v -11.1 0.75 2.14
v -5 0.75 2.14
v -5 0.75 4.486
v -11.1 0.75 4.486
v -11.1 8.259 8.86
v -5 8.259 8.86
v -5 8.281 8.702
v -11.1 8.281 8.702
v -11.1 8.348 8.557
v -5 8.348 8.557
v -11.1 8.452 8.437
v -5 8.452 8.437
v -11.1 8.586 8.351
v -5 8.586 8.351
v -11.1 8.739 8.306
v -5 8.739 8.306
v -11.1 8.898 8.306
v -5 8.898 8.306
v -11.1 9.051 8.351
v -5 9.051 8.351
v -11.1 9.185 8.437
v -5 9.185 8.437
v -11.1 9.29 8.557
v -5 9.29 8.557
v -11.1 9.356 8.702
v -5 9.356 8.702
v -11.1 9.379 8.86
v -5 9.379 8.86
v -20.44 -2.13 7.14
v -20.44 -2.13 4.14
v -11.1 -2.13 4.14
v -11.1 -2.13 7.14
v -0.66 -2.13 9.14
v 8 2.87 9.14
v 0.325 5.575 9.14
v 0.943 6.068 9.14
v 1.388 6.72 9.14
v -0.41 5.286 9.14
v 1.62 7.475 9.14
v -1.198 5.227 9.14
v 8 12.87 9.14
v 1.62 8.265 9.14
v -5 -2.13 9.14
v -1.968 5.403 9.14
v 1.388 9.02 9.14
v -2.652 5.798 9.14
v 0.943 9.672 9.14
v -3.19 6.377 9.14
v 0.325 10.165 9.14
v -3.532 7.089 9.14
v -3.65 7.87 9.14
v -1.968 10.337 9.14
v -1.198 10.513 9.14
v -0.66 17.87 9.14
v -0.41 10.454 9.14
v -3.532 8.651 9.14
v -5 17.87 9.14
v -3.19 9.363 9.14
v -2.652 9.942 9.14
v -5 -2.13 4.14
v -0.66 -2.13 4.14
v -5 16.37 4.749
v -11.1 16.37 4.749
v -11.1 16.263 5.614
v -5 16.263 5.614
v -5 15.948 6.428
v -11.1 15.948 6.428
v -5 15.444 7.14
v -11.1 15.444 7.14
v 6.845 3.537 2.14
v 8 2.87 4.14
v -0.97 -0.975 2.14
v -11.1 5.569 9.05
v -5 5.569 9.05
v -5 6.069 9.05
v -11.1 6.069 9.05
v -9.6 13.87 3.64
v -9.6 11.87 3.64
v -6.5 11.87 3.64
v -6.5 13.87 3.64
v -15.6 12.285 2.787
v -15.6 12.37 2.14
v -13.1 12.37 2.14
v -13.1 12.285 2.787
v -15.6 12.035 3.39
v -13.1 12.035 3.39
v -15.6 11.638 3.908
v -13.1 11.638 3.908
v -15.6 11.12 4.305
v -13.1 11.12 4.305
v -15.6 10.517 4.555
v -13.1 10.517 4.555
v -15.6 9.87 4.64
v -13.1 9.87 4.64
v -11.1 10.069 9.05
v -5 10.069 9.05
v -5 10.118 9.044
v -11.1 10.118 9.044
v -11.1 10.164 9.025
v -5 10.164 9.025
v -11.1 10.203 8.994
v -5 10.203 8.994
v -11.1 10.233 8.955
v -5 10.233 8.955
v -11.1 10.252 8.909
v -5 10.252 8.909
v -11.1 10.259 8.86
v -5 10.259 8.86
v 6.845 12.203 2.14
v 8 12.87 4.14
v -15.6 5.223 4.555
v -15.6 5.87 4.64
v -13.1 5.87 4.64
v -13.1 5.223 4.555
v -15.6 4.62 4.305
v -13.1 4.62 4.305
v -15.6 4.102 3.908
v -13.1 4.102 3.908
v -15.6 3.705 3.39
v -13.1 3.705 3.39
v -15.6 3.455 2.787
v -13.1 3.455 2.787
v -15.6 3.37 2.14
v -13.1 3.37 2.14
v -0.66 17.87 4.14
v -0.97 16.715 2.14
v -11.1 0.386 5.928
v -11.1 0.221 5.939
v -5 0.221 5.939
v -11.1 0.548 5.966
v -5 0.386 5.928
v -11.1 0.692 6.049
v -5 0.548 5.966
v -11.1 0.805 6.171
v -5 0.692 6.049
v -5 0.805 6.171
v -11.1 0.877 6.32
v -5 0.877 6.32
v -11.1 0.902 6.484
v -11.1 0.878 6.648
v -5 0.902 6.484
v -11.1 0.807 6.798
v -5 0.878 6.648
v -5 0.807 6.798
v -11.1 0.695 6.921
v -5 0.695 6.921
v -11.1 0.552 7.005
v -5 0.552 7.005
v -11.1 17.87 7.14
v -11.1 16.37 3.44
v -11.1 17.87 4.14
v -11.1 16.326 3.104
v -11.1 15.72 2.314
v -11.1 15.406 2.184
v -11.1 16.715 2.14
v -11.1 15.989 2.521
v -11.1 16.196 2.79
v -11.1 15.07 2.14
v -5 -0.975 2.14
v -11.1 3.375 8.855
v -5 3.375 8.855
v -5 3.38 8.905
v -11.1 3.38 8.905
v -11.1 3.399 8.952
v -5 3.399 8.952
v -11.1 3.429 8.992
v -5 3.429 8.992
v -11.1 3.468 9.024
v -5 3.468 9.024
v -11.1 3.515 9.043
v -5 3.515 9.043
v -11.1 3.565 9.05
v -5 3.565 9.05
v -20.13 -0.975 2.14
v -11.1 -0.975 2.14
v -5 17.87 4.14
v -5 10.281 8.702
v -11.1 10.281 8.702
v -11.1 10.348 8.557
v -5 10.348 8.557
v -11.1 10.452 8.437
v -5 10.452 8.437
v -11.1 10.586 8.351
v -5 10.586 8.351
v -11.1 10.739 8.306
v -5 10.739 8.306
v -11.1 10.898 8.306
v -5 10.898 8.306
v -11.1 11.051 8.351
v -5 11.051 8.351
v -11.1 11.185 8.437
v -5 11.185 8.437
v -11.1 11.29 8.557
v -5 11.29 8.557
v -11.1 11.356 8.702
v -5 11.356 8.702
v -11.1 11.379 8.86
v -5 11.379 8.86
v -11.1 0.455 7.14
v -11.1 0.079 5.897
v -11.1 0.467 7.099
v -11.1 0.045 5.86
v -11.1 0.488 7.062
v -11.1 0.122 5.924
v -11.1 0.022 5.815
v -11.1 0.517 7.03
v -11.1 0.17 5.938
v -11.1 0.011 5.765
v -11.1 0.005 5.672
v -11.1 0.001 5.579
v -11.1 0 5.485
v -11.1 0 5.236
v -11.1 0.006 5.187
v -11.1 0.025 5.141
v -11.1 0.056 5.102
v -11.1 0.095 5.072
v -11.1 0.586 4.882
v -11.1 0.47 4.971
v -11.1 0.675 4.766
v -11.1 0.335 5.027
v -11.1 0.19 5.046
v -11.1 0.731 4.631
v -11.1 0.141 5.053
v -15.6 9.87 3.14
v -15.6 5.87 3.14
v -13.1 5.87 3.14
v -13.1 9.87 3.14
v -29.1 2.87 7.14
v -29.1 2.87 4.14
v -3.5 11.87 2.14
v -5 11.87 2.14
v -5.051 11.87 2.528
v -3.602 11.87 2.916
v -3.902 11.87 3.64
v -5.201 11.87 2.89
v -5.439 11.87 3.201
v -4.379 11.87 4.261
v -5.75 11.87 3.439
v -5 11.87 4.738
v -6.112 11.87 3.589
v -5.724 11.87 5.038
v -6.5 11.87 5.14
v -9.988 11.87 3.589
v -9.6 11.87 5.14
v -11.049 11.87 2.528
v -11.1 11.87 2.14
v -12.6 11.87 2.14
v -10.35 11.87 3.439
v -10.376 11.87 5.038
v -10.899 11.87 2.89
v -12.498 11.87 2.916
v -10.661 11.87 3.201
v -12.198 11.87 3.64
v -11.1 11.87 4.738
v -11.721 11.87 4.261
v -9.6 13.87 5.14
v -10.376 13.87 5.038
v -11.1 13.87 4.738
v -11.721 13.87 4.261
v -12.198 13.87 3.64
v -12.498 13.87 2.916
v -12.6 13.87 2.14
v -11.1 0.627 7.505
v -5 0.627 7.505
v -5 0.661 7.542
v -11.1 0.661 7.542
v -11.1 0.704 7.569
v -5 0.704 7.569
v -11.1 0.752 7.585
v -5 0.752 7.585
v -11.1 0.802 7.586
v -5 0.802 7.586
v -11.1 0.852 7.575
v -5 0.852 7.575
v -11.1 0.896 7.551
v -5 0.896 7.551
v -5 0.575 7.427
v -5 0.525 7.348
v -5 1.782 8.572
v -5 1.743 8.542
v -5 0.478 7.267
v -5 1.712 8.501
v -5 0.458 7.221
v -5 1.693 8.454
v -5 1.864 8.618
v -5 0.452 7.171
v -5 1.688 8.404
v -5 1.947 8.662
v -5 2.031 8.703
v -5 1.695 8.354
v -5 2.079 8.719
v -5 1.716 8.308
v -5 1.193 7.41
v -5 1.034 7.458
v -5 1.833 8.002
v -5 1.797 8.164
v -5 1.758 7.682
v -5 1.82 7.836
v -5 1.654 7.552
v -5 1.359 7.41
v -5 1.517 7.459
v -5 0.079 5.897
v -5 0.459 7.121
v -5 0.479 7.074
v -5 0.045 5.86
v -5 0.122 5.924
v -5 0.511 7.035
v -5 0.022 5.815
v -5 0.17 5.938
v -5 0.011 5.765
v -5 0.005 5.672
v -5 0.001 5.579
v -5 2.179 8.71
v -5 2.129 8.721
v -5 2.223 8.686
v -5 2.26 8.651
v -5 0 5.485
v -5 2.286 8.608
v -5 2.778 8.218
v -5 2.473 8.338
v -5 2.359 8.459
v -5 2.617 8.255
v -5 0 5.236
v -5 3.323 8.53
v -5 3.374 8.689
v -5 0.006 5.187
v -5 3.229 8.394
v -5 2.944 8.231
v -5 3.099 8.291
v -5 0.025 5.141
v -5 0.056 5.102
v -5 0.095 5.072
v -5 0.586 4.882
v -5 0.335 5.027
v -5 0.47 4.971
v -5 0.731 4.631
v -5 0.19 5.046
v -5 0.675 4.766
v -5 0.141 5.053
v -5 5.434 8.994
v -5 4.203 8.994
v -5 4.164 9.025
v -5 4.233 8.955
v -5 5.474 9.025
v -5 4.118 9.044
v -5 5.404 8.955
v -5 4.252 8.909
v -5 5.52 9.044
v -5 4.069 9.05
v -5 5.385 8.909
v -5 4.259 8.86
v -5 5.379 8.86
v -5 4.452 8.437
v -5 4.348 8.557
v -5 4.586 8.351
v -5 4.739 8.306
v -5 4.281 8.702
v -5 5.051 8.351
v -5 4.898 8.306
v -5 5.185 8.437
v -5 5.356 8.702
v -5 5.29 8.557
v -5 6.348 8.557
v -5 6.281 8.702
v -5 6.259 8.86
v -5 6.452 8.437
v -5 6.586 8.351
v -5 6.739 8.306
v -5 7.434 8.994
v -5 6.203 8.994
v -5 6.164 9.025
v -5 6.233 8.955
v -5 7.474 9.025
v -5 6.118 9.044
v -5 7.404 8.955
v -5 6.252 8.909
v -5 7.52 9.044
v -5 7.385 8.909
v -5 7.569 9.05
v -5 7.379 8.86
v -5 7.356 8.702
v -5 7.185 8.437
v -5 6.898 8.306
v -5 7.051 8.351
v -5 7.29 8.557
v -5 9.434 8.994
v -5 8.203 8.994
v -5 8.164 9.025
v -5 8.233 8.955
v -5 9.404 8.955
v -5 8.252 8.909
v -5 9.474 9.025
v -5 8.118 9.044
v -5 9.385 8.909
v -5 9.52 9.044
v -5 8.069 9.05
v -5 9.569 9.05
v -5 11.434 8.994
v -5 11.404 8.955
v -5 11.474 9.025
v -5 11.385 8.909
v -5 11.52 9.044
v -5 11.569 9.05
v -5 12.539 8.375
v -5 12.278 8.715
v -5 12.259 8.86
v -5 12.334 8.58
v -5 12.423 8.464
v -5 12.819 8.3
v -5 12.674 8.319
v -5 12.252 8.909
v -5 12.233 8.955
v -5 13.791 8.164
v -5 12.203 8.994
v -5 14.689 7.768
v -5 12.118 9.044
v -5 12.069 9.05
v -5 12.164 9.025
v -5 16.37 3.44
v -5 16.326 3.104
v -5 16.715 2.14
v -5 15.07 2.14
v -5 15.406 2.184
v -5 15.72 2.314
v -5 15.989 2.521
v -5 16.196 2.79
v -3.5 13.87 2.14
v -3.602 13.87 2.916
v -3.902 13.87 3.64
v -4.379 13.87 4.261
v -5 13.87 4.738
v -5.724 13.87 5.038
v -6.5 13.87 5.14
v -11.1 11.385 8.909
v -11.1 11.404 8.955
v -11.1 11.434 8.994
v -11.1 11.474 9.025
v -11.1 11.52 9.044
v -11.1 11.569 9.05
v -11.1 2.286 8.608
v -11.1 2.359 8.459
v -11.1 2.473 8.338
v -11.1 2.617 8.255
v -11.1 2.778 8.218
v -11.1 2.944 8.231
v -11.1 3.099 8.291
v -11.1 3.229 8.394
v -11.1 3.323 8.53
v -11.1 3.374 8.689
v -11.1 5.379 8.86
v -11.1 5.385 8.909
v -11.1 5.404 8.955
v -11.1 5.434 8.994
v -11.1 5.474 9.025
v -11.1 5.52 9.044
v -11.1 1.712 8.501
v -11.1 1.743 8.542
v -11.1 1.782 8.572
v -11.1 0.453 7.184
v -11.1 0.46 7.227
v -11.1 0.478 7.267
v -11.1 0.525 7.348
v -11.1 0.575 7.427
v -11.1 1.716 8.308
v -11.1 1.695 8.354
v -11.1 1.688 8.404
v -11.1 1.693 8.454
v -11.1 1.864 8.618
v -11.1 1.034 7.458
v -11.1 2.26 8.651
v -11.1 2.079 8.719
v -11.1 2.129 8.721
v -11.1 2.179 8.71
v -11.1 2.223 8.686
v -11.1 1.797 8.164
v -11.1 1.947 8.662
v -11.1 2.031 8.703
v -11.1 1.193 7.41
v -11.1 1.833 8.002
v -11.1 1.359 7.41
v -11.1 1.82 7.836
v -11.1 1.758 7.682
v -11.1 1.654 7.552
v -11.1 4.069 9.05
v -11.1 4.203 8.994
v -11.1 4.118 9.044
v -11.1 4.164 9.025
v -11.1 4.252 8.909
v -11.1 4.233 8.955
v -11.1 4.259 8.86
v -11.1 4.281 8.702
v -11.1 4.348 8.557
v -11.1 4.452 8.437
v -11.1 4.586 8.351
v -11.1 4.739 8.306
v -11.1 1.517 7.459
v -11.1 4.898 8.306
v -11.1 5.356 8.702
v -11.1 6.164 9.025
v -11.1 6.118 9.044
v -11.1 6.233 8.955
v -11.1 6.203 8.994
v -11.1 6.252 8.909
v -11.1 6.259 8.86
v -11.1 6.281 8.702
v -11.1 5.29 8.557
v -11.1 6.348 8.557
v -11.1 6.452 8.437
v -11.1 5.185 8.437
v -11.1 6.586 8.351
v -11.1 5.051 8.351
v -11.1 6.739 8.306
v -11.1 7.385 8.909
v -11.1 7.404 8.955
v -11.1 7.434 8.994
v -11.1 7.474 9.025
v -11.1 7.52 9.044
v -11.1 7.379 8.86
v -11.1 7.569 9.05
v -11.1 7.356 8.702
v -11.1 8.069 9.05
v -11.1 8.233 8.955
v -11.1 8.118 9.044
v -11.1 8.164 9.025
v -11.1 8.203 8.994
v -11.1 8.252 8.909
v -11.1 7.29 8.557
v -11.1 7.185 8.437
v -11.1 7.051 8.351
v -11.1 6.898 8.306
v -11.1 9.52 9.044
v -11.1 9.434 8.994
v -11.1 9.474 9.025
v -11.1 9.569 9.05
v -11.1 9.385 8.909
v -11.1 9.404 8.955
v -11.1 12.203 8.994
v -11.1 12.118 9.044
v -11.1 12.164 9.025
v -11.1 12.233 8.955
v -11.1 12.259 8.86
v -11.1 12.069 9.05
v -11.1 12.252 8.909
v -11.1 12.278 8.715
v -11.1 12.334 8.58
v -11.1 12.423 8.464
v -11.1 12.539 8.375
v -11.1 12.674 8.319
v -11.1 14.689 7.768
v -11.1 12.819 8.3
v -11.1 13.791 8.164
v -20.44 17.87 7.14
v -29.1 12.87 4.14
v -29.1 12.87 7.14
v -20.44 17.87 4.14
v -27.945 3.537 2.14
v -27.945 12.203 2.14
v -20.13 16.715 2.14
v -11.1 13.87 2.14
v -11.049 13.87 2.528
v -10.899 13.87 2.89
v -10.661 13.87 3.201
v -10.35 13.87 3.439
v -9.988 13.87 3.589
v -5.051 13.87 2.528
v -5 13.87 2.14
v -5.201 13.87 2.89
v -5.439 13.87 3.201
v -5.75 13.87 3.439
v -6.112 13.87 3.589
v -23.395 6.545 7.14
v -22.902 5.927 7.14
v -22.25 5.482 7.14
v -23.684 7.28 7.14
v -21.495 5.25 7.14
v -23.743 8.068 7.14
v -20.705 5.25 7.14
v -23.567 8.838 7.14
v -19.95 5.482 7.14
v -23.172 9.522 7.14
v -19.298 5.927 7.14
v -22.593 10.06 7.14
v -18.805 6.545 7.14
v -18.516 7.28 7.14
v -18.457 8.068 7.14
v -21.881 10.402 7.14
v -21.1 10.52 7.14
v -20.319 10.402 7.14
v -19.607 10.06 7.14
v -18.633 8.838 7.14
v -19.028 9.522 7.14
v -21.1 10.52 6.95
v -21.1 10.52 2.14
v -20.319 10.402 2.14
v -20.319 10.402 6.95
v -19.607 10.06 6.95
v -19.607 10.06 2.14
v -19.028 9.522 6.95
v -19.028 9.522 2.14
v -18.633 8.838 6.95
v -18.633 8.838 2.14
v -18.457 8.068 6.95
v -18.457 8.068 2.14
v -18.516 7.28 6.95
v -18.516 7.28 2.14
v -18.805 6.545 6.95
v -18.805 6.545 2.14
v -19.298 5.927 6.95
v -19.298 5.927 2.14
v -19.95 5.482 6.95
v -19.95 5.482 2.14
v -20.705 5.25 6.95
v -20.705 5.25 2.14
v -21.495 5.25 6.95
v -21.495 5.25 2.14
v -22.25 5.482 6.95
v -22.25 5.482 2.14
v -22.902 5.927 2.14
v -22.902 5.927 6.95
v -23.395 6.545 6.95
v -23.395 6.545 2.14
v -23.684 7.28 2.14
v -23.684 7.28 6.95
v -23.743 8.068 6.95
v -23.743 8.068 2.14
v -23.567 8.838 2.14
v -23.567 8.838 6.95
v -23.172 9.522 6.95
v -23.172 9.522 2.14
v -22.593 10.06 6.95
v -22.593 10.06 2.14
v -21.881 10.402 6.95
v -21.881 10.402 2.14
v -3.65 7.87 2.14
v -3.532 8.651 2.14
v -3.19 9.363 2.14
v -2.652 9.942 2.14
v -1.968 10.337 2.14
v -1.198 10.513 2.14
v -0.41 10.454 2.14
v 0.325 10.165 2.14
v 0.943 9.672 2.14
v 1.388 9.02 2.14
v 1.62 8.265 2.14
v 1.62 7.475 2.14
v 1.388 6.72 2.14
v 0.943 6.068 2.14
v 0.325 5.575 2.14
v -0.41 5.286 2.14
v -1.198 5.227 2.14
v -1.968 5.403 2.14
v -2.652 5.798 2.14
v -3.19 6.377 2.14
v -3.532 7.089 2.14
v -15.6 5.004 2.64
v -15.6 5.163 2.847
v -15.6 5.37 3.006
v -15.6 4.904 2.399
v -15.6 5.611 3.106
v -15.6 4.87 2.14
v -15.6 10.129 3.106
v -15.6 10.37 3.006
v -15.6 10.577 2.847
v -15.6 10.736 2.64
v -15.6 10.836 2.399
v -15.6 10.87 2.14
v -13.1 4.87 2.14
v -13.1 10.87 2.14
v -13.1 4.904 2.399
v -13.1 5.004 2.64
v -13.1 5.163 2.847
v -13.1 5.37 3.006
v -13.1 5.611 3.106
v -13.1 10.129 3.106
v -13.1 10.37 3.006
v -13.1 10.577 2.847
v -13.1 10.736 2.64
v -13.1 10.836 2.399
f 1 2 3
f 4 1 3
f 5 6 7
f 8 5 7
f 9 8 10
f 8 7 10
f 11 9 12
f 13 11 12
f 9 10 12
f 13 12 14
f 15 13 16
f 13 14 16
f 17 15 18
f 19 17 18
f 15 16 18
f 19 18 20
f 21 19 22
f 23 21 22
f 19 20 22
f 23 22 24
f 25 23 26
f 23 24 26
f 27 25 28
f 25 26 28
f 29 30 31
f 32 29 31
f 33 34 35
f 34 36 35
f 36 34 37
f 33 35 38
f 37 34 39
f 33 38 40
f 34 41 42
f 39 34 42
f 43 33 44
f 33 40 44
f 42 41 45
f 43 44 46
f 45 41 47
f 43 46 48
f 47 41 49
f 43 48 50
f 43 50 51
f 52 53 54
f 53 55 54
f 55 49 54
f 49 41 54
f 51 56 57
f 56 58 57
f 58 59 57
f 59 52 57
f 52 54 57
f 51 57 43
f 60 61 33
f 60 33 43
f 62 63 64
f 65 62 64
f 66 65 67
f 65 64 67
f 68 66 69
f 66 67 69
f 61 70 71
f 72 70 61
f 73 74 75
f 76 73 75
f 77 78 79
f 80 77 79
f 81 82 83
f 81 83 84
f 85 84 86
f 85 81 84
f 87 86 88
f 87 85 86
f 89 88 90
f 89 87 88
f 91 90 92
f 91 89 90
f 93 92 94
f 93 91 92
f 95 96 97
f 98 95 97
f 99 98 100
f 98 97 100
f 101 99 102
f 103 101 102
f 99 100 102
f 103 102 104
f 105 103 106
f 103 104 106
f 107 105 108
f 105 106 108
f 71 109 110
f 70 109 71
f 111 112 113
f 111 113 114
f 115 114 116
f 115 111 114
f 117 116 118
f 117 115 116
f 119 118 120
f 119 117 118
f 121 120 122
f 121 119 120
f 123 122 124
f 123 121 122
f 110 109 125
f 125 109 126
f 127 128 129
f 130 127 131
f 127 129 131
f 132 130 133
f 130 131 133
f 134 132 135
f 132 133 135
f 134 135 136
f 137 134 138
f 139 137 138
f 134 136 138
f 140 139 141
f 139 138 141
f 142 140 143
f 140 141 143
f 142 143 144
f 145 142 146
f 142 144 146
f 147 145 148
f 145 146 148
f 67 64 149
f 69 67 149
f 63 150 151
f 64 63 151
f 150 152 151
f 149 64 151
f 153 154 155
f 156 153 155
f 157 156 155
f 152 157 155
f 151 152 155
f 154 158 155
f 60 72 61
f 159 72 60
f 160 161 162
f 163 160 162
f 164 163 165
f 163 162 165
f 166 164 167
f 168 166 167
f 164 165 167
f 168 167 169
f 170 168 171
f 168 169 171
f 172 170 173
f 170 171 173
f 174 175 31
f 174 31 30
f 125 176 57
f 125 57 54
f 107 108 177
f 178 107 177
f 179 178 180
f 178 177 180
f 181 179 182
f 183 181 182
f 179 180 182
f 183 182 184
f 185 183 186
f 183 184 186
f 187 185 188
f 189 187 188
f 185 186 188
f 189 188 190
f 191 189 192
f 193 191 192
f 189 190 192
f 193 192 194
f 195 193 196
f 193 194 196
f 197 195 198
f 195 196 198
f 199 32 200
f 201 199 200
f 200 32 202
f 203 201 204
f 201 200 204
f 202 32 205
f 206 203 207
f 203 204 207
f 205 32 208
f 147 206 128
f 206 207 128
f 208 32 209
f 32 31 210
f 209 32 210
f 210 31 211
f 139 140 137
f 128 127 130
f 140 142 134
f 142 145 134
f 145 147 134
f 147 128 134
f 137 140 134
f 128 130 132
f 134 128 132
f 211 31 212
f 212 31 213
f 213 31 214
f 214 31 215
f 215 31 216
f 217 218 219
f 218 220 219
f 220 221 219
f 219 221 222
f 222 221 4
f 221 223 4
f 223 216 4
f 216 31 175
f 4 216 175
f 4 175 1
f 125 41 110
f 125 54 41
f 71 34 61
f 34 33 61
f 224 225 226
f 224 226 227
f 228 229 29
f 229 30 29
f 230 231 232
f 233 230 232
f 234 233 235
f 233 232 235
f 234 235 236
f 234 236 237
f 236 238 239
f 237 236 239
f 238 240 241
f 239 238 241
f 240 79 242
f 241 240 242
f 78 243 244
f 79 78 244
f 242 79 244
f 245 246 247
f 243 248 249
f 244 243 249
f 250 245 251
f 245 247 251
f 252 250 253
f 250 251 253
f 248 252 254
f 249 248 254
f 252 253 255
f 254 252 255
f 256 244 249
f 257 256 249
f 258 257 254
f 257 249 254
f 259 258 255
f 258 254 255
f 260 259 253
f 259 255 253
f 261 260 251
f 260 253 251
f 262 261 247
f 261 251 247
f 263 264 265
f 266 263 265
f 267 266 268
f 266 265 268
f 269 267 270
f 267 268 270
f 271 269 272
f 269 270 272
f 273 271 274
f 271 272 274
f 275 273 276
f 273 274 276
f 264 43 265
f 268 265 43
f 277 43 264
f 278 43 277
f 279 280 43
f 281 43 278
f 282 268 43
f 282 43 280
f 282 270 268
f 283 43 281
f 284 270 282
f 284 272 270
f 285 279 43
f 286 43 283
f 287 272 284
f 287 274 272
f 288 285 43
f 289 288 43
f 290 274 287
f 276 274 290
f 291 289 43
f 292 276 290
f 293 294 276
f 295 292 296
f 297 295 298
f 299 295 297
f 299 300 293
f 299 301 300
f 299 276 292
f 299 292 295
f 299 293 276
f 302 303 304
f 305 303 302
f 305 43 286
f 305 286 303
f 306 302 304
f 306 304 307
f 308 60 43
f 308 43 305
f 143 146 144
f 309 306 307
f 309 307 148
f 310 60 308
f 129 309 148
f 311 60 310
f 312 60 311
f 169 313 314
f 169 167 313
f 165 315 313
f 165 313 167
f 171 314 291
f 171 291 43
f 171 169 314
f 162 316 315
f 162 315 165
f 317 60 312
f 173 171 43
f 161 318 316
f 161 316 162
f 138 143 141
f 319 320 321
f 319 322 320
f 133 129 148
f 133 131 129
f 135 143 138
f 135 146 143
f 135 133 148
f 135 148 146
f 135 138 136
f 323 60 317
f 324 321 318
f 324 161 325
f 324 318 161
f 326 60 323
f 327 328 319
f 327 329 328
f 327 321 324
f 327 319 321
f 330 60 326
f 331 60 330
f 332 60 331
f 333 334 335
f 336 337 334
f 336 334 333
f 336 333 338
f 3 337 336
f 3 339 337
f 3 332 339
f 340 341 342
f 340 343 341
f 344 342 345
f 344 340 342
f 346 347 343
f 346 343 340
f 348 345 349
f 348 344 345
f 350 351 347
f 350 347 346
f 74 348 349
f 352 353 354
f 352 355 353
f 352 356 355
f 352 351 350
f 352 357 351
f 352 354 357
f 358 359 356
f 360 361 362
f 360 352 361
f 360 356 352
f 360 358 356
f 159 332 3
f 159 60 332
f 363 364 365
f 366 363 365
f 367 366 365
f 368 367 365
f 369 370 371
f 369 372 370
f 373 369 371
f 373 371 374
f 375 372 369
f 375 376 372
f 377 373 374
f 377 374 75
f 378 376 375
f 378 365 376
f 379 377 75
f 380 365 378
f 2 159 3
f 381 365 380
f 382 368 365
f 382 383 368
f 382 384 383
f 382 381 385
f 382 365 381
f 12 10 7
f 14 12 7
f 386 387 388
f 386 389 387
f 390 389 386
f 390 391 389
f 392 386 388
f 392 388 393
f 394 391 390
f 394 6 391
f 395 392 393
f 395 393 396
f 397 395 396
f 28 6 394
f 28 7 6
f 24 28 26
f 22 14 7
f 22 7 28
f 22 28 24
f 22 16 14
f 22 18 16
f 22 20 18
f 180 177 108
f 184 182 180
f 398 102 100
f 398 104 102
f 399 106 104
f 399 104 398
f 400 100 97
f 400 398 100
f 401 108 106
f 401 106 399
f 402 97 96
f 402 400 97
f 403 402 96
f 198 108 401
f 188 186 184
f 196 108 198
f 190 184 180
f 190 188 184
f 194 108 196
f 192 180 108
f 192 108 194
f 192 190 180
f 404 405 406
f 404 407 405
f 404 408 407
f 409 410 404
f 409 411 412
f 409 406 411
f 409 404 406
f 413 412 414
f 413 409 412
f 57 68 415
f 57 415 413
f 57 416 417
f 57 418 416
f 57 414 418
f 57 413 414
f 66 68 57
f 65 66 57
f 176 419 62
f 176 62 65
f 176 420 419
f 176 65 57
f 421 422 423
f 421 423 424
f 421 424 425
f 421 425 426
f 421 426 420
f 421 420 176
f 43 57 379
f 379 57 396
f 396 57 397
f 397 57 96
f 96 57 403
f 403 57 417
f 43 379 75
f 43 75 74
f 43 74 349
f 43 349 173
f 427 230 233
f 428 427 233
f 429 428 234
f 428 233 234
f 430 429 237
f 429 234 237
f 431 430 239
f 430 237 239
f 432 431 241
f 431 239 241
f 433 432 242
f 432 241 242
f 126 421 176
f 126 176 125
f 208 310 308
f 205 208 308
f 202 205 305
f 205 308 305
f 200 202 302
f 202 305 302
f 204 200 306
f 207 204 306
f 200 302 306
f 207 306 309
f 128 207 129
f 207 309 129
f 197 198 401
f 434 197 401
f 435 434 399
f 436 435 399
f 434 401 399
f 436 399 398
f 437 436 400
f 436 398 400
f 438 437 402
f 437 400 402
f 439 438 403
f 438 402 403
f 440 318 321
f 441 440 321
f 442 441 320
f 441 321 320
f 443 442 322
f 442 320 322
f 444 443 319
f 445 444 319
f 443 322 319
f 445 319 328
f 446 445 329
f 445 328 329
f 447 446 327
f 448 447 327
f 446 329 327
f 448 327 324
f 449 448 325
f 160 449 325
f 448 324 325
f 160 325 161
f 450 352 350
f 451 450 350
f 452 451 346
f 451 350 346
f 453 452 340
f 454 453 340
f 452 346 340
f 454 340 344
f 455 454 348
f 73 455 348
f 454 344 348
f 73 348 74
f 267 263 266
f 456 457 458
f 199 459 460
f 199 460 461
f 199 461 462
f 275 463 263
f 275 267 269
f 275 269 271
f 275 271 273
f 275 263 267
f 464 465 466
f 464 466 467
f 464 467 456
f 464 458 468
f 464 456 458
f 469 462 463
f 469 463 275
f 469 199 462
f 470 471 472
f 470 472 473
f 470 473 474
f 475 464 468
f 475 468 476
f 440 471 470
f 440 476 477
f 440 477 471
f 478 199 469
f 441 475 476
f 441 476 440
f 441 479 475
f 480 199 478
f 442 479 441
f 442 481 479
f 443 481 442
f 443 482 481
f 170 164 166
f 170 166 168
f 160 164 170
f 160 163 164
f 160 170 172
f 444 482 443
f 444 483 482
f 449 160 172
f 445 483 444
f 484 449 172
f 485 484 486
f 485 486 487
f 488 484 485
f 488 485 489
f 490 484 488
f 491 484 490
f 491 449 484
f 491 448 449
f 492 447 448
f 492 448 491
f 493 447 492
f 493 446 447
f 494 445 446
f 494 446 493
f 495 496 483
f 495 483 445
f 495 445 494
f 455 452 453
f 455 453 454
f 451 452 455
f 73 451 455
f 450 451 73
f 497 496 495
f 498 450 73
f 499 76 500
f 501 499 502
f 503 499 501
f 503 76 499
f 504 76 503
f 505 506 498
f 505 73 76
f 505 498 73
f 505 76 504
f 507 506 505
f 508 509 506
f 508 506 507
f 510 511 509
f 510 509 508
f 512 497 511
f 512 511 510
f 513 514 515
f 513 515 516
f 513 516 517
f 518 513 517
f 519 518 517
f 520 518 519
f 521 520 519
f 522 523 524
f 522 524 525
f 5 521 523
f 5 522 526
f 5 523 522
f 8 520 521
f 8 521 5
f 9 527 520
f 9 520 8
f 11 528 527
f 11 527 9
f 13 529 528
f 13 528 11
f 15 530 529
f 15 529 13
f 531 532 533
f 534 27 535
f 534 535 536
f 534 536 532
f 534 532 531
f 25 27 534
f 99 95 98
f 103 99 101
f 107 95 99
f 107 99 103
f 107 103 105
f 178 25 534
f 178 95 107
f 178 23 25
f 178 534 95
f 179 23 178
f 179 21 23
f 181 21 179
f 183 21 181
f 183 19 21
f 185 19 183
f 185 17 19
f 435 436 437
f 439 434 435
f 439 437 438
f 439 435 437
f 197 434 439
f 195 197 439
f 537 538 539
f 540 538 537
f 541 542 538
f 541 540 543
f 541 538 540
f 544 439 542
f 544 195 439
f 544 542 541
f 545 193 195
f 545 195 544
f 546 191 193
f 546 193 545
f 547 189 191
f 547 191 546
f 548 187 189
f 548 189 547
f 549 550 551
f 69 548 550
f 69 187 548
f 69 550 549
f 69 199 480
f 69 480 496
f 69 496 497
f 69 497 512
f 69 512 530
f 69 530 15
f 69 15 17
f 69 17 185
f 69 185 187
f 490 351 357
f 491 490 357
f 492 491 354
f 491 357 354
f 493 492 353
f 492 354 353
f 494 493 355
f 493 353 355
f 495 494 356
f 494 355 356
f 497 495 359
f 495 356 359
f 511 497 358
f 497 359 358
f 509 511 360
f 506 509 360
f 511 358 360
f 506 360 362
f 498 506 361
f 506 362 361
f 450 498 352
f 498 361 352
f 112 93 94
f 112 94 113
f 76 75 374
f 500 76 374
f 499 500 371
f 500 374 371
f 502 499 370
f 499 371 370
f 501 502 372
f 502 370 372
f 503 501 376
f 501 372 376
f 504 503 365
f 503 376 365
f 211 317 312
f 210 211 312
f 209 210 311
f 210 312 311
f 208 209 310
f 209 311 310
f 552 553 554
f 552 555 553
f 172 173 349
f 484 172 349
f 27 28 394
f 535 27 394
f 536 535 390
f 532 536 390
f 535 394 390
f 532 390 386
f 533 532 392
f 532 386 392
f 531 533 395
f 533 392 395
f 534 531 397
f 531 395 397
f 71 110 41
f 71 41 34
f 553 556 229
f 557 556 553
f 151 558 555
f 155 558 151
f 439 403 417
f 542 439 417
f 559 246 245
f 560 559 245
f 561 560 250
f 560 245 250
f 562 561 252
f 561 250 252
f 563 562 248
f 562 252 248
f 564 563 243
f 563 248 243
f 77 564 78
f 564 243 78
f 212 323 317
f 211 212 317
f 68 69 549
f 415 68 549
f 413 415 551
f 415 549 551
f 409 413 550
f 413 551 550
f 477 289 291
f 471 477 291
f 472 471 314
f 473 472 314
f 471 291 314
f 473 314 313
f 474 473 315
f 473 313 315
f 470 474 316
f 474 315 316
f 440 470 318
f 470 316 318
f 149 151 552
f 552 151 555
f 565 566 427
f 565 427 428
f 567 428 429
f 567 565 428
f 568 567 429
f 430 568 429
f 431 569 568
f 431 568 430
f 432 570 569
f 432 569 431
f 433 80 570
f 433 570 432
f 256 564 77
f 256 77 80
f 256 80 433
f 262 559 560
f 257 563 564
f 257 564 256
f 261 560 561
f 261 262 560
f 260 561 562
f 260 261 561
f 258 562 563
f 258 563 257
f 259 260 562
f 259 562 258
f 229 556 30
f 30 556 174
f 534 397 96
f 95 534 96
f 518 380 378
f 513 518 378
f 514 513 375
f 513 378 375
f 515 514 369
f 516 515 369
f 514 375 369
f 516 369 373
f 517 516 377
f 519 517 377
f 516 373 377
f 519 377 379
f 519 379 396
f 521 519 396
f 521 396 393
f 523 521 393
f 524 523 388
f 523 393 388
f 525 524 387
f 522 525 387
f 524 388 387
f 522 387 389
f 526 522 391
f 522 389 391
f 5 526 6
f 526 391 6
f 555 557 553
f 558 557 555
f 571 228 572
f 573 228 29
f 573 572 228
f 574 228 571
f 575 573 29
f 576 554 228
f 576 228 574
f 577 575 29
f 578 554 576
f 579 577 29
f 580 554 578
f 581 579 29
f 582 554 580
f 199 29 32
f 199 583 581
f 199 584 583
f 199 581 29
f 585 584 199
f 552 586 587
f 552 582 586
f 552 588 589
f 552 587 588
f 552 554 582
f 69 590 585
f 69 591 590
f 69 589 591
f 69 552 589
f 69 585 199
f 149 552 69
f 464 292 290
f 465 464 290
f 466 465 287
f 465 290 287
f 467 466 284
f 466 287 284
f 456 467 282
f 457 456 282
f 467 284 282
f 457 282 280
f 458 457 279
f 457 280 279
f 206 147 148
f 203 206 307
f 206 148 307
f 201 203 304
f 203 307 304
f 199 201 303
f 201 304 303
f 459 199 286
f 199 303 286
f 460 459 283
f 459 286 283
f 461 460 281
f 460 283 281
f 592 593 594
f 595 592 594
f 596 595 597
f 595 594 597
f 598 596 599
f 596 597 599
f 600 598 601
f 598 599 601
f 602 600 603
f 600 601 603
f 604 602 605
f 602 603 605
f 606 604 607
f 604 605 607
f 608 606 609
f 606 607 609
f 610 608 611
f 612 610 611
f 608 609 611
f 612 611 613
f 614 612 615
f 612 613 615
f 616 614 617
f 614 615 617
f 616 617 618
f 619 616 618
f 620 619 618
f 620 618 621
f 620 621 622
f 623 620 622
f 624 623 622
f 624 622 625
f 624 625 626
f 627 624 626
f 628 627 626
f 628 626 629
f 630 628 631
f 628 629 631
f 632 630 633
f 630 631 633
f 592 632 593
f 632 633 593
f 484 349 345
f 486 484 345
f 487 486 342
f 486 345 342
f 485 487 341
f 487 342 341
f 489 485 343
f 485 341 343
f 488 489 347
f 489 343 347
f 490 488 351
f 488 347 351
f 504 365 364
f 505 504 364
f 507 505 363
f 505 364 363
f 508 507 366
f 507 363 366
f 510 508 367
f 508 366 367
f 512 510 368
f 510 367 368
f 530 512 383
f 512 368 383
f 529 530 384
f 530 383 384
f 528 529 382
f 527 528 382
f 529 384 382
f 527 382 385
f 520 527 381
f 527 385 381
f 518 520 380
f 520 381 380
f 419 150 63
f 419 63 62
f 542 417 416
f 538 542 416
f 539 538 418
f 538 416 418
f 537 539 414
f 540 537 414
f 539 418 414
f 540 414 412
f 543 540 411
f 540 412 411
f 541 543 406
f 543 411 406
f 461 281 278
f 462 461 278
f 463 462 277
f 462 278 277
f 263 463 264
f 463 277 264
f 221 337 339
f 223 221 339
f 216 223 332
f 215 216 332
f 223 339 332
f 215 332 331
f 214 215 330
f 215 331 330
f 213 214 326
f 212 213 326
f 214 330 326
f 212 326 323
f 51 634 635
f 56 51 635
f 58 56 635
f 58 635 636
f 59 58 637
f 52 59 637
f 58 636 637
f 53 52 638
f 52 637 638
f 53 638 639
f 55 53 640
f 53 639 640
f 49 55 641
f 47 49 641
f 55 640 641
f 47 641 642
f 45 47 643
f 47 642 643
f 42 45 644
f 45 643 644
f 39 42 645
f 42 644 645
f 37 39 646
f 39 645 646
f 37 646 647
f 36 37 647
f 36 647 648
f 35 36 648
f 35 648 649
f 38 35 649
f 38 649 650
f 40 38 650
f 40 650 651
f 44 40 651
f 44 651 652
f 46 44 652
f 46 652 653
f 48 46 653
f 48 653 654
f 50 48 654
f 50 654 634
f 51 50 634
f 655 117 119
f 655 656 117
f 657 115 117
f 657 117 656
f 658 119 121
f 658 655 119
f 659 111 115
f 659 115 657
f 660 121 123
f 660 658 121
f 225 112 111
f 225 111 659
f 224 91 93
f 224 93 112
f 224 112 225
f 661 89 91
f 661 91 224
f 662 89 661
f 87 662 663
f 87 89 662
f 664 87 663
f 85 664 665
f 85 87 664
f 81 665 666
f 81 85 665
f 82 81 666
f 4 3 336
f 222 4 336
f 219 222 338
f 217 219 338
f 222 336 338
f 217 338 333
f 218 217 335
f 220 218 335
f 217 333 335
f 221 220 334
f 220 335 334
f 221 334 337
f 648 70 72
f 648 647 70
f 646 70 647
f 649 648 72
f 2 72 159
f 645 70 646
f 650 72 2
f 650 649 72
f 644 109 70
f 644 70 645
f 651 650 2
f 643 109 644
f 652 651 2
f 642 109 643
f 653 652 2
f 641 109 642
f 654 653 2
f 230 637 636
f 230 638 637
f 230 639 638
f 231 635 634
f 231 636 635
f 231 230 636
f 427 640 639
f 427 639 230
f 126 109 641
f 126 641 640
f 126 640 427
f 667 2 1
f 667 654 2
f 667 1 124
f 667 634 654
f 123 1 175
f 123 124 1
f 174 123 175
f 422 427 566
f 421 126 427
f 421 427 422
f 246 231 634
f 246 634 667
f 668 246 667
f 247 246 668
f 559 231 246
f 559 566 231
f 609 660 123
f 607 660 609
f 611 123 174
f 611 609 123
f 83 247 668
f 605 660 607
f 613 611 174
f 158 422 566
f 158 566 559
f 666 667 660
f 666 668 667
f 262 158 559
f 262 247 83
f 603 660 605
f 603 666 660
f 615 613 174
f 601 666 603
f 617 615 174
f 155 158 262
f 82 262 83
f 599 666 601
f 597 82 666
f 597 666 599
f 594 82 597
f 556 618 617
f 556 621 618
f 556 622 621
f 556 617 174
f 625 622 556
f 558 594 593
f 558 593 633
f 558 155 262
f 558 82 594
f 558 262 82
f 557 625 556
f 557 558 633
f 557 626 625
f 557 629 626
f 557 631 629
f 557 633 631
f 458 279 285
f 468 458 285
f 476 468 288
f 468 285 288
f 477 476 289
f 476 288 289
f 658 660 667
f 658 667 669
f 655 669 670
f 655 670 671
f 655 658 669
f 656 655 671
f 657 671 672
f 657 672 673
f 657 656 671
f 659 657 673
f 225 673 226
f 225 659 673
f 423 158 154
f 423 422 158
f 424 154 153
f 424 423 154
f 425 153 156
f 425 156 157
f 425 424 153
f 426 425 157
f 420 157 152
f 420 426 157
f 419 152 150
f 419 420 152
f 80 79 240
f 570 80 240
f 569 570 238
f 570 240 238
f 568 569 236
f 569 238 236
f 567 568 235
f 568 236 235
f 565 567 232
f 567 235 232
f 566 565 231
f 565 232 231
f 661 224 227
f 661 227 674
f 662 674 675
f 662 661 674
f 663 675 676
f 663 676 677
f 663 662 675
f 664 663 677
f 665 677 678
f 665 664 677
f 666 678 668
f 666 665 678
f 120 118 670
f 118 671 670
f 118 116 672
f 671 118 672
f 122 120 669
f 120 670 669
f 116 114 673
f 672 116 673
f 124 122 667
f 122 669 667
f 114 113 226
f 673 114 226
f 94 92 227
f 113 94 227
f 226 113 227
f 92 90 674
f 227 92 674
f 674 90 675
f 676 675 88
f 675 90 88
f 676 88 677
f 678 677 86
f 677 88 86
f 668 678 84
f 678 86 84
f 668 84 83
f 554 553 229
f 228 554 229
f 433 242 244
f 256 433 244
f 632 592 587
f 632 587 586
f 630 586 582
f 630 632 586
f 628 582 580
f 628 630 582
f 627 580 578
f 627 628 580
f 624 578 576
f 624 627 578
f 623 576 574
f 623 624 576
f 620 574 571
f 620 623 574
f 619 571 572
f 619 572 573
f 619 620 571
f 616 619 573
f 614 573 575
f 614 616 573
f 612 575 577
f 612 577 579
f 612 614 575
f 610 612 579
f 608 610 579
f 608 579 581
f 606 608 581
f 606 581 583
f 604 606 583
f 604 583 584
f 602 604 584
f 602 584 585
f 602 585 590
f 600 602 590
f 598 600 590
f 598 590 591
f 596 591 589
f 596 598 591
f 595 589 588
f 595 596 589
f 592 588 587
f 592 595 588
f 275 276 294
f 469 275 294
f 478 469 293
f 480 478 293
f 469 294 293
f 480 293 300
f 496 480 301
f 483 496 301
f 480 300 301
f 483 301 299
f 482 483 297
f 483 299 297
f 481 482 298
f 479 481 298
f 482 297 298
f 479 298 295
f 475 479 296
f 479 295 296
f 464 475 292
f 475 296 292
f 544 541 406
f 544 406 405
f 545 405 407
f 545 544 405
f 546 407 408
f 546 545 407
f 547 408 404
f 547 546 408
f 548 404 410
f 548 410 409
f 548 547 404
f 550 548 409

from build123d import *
from OCP.BRepFilletAPI import BRepFilletAPI_MakeChamfer

# Parameters (mm, degrees)
AUFSATZ_LINEAR_AUSTRAGEN1_DEPTH    = 6.1
SKIZZE1_W                          = 6
SKIZZE1_H                          = 15
AUFSATZ_LINEAR_AUSTRAGEN1_2_DEPTH  = 6.1
SKIZZE2_W                          = 6
SKIZZE2_H                          = 15
SCHNITT_LINEAR_AUSTRAGEN1_DEPTH    = 6.1
SKIZZE3_R                          = 2.65
AUFSATZ_LINEAR_AUSTRAGEN2_DEPTH    = 2.19
SCHNITT_LINEAR_AUSTRAGEN7_DEPTH    = 6.1
AUFSATZ_LINEAR_START               = 4.81
SKIZZE4_R                          = 2.65
AUFSATZ_LINEAR_AUSTRAGEN3_DEPTH    = 4.81
SKIZZE5_R                          = 2.65
AUFSATZ_LINEAR_AUSTRAGEN4_DEPTH    = 0.19
FASE1_SIZE                         = 5
FASE1_SIZE2                        = 8.660254038
FASE2_SIZE                         = 2
FASE2_SIZE2                        = 1.154700538
SCHNITT_LINEAR_START               = -14
SCHNITT_LINEAR_AUSTRAGEN8_DEPTH    = 2
SCHNITT_LINEAR_START_2             = -13.5
SCHNITT_LINEAR_AUSTRAGEN5_DEPTH    = 2.5
VERRUNDUNG1_R                      = 1.3
SCHNITT_LINEAR_AUSTRAGEN9_DEPTH    = 6.1
K_RPER_VERSCHIEBEN_KOPIEREN1_ANGLE = 90


with BuildPart() as part:
    # Skizze1 → Aufsatz-Linear austragen1 (new body)
    with BuildSketch(Plane.XY):
        with BuildLine():
            Line((-7.050000002, 7.568775844), (-7.050000002, 8.068775844))
            ThreePointArc((-7.050000002, 8.068775844), (-7.105649713, 8.203126132), (-7.240000002, 8.258775844))
            ThreePointArc((-7.240000002, 8.258775844), (-7.800000002, 8.818775844), (-7.240000002, 9.378775844))
            ThreePointArc((-7.240000002, 9.378775844), (-7.105649713, 9.434425555), (-7.050000002, 9.568775844))
            Line((-7.050000002, 9.568775844), (-7.050000002, 10.068775844))
            ThreePointArc((-7.050000002, 10.068775844), (-7.105649713, 10.203126132), (-7.240000002, 10.258775844))
            ThreePointArc((-7.240000002, 10.258775844), (-7.800000002, 10.818775844), (-7.240000002, 11.378775844))
            ThreePointArc((-7.240000002, 11.378775844), (-7.105649713, 11.434425555), (-7.050000002, 11.568775844))
            Line((-7.050000002, 11.568775844), (-7.050000002, 12.068775844))
            ThreePointArc((-7.050000002, 12.068775844), (-7.105649713, 12.203126132), (-7.240000002, 12.258775843))
            Line((-7.240000002, 12.258775843), (-9.150000002, 12.258775843))
            Line((-9.150000002, 12.258775843), (-9.150000002, 4))
            Line((-9.150000002, 4), (-10.615000002, 4))
            Line((-10.615000002, 4), (-13.960000002, 4))
            Line((-13.960000002, 4), (-13.960000002, 0.75))
            Line((-13.960000002, 0.75), (-11.613821225, 0.75))
            ThreePointArc((-11.613821225, 0.75), (-11.217841428, 0.585979797), (-11.053821225, 0.19))
            ThreePointArc((-11.053821225, 0.19), (-10.998171513, 0.055649712), (-10.863821225, 0))
            Line((-10.863821225, 0), (-10.615000002, 0))
            ThreePointArc((-10.615000002, 0), (-10.474650873, 0.002763747), (-10.334519354, 0.011050703))
            ThreePointArc((-10.334519354, 0.011050703), (-10.203241743, 0.079144265), (-10.160552613, 0.22073587))
            ThreePointArc((-10.160552613, 0.22073587), (-9.779942741, 0.876709768), (-9.094653704, 0.551833537))
            ThreePointArc((-9.094653704, 0.551833537), (-8.979253962, 0.459348706), (-8.832500002, 0.477619436))
            ThreePointArc((-8.832500002, 0.477619436), (-8.712335964, 0.550187475), (-8.595121987, 0.627429949))
            ThreePointArc((-8.595121987, 0.627429949), (-8.515479022, 0.752039509), (-8.549304953, 0.896006001))
            ThreePointArc((-8.549304953, 0.896006001), (-8.547674084, 1.654400997), (-7.791758254, 1.715694446))
            ThreePointArc((-7.791758254, 1.715694446), (-7.64557673, 1.693300104), (-7.527619437, 1.7825))
            ThreePointArc((-7.527619437, 1.7825), (-7.459838348, 1.905427785), (-7.396949303, 2.030928718))
            ThreePointArc((-7.396949303, 2.030928718), (-7.390281252, 2.178665245), (-7.491558614, 2.286430919))
            ThreePointArc((-7.491558614, 2.286430919), (-7.869343738, 2.944035686), (-7.24534815, 3.375075285))
            ThreePointArc((-7.24534815, 3.375075285), (-7.107554066, 3.428771978), (-7.050000002, 3.565))
            Line((-7.050000002, 3.565), (-7.050000002, 4.068775844))
            ThreePointArc((-7.050000002, 4.068775844), (-7.105649713, 4.203126132), (-7.240000002, 4.258775844))
            ThreePointArc((-7.240000002, 4.258775844), (-7.800000002, 4.818775844), (-7.240000002, 5.378775844))
            ThreePointArc((-7.240000002, 5.378775844), (-7.105649713, 5.434425555), (-7.050000002, 5.568775844))
            Line((-7.050000002, 5.568775844), (-7.050000002, 6.068775844))
            ThreePointArc((-7.050000002, 6.068775844), (-7.105649713, 6.203126132), (-7.240000002, 6.258775844))
            ThreePointArc((-7.240000002, 6.258775844), (-7.800000002, 6.818775844), (-7.240000002, 7.378775844))
            ThreePointArc((-7.240000002, 7.378775844), (-7.105649713, 7.434425555), (-7.050000002, 7.568775844))
        make_face()
    extrude(amount=AUFSATZ_LINEAR_AUSTRAGEN1_DEPTH)

    # Skizze3 → Aufsatz-Linear austragen2 (add)
    with BuildSketch(Plane.ZY.offset(9.150000002)):
        Polygon((6.1, 12.258775843), (6.1, 16.37), (0, 16.37), (0, 17.87), (-13, 17.87), (-13, -2.13), (0, -2.13), (0, 12.258775843), align=None)
        with Locations((-4, 7.87)):
            Circle(SKIZZE3_R, mode=Mode.SUBTRACT)
    extrude(amount=-AUFSATZ_LINEAR_AUSTRAGEN2_DEPTH)

    # Skizze15 → Schnitt-Linear austragen7 (cut)
    with BuildSketch(Plane.XY.offset(6.1)):
        with BuildLine():
            Line((-7.800000002, 12.818775843), (-7.800000002, 15.07))
            ThreePointArc((-7.800000002, 15.07), (-8.180761186, 15.989238816), (-9.100000002, 16.37))
            Line((-9.100000002, 16.37), (-6.960000002, 16.37))
            Line((-6.960000002, 16.37), (-6.960000002, 12.258775843))
            Line((-6.960000002, 12.258775843), (-7.240000002, 12.258775843))
            ThreePointArc((-7.240000002, 12.258775843), (-7.635979799, 12.422796046), (-7.800000002, 12.818775843))
        make_face()
    extrude(amount=-SCHNITT_LINEAR_AUSTRAGEN7_DEPTH, mode=Mode.SUBTRACT)

    # Skizze4 → Aufsatz-Linear austragen3 (add)
    with BuildSketch(Plane.ZY.offset(9.150000002).offset(AUFSATZ_LINEAR_START)):
        Polygon((6.1, 17.87), (6.1, 16.37), (0, 16.37), (0, 17.87), (-13, 17.87), (-13, -2.13), (0, -2.13), (0, 4), (6.1, 4), (6.1, -2.13), (24.1, -2.13), (24.1, 17.87), align=None)
        with Locations(Location((16.1, 7.87, 0), (0, 0, 90))):
            Circle(SKIZZE4_R, mode=Mode.SUBTRACT)
        with Locations((-4, 7.87)):
            Circle(SKIZZE4_R, mode=Mode.SUBTRACT)
    extrude(amount=-AUFSATZ_LINEAR_AUSTRAGEN3_DEPTH)

    # Skizze5 → Aufsatz-Linear austragen4 (add)
    with BuildSketch(Plane(origin=(-9.150000002, 0, 0), x_dir=(0, 0, -1), z_dir=(1, 0, 0))):
        Polygon((-6.1, 17.87), (-24.1, 17.87), (-24.1, -2.13), (-6.1, -2.13), (-6.1, 0.655715781), (-6.1, 16.37), align=None)
        with Locations(Location((-16.1, 7.87, 0), (0, 0, 90))):
            Circle(SKIZZE5_R, mode=Mode.SUBTRACT)
    extrude(amount=AUFSATZ_LINEAR_AUSTRAGEN4_DEPTH)

    # Fase1: one chamfer whose edges measure the first distance from different faces: ONE call of the kernel's chamfer builder (chamfer() names one face for all edges)
    fase1_edges_1 = [part.edges().sort_by_distance(p)[0] for p in [
        (-10.460000002, -2.13, -13),
        (-10.460000002, 17.87, -13),
    ]]
    fase1_side_1 = [part.faces().sort_by_distance(p)[0] for p in [
        (-10.460000002, 7.87, -13),
    ]]
    fase1_edges_2 = [part.edges().sort_by_distance(p)[0] for p in [
        (-11.460000002, 17.87, 24.1),
        (-11.460000002, -2.13, 24.1),
    ]]
    fase1_side_2 = [part.faces().sort_by_distance(p)[0] for p in [
        (-11.460000002, 7.87, 24.1),
    ]]
    fase1 = BRepFilletAPI_MakeChamfer(part.part.solid().wrapped)
    for e in fase1_edges_1:
        fase1.Add(FASE1_SIZE, FASE1_SIZE2, e.wrapped, fase1_side_1[0].wrapped)  # the first distance lies on this face
    for e in fase1_edges_2:
        fase1.Add(FASE1_SIZE, FASE1_SIZE2, e.wrapped, fase1_side_2[0].wrapped)  # the first distance lies on this face
    add(Compound.cast(fase1.Shape()), mode=Mode.REPLACE)

    # Fase2: one chamfer whose edges measure the first distance from different faces: ONE call of the kernel's chamfer builder (chamfer() names one face for all edges)
    fase2_edges_1 = [part.edges().sort_by_distance(p)[0] for p in [
        (-13.960000002, 17.87, 10.769872981),
    ]]
    fase2_side_1 = [part.faces().sort_by_distance(p)[0] for p in [
        (-11.460000002, 17.87, 10.769872981),
    ]]
    fase2_edges_2 = [part.edges().sort_by_distance(p)[0] for p in [
        (-13.960000002, 17.87, -2.169872981),
    ]]
    fase2_side_2 = [part.faces().sort_by_distance(p)[0] for p in [
        (-10.460000002, 17.87, -2.169872981),
    ]]
    fase2_edges_3 = [part.edges().sort_by_distance(p)[0] for p in [
        (-13.960000002, -2.13, 10.769872981),
    ]]
    fase2_side_3 = [part.faces().sort_by_distance(p)[0] for p in [
        (-11.460000002, -2.13, 10.769872981),
    ]]
    fase2_edges_4 = [part.edges().sort_by_distance(p)[0] for p in [
        (-13.960000002, 7.87, 24.1),
    ]]
    fase2_side_4 = [part.faces().sort_by_distance(p)[0] for p in [
        (-11.460000002, 7.87, 24.1),
    ]]
    fase2_edges_5 = [part.edges().sort_by_distance(p)[0] for p in [
        (-13.960000002, 7.87, -13),
    ]]
    fase2_side_5 = [part.faces().sort_by_distance(p)[0] for p in [
        (-10.460000002, 7.87, -13),
    ]]
    fase2_edges_6 = [part.edges().sort_by_distance(p)[0] for p in [
        (-13.960000002, -2.13, -2.169872981),
    ]]
    fase2_side_6 = [part.faces().sort_by_distance(p)[0] for p in [
        (-10.460000002, -2.13, -2.169872981),
    ]]
    fase2_edges_7 = [part.edges().sort_by_distance(p)[0] for p in [
        (-13.960000002, 0.37, -8.669872981),
    ]]
    fase2_side_7 = [part.faces().sort_by_distance(p)[0] for p in [
        (-10.460000002, 0.37, -8.669872981),
    ]]
    fase2_edges_8 = [part.edges().sort_by_distance(p)[0] for p in [
        (-13.960000002, 0.37, 19.769872981),
    ]]
    fase2_side_8 = [part.faces().sort_by_distance(p)[0] for p in [
        (-11.460000002, 0.37, 19.769872981),
    ]]
    fase2_edges_9 = [part.edges().sort_by_distance(p)[0] for p in [
        (-13.960000002, 15.37, -8.669872981),
    ]]
    fase2_side_9 = [part.faces().sort_by_distance(p)[0] for p in [
        (-10.460000002, 15.37, -8.669872981),
    ]]
    fase2_edges_10 = [part.edges().sort_by_distance(p)[0] for p in [
        (-13.960000002, 15.37, 19.769872981),
    ]]
    fase2_side_10 = [part.faces().sort_by_distance(p)[0] for p in [
        (-11.460000002, 15.37, 19.769872981),
    ]]
    fase2 = BRepFilletAPI_MakeChamfer(part.part.solid().wrapped)
    for e in fase2_edges_1:
        fase2.Add(FASE2_SIZE, FASE2_SIZE2, e.wrapped, fase2_side_1[0].wrapped)  # the first distance lies on this face
    for e in fase2_edges_2:
        fase2.Add(FASE2_SIZE, FASE2_SIZE2, e.wrapped, fase2_side_2[0].wrapped)  # the first distance lies on this face
    for e in fase2_edges_3:
        fase2.Add(FASE2_SIZE, FASE2_SIZE2, e.wrapped, fase2_side_3[0].wrapped)  # the first distance lies on this face
    for e in fase2_edges_4:
        fase2.Add(FASE2_SIZE, FASE2_SIZE2, e.wrapped, fase2_side_4[0].wrapped)  # the first distance lies on this face
    for e in fase2_edges_5:
        fase2.Add(FASE2_SIZE, FASE2_SIZE2, e.wrapped, fase2_side_5[0].wrapped)  # the first distance lies on this face
    for e in fase2_edges_6:
        fase2.Add(FASE2_SIZE, FASE2_SIZE2, e.wrapped, fase2_side_6[0].wrapped)  # the first distance lies on this face
    for e in fase2_edges_7:
        fase2.Add(FASE2_SIZE, FASE2_SIZE2, e.wrapped, fase2_side_7[0].wrapped)  # the first distance lies on this face
    for e in fase2_edges_8:
        fase2.Add(FASE2_SIZE, FASE2_SIZE2, e.wrapped, fase2_side_8[0].wrapped)  # the first distance lies on this face
    for e in fase2_edges_9:
        fase2.Add(FASE2_SIZE, FASE2_SIZE2, e.wrapped, fase2_side_9[0].wrapped)  # the first distance lies on this face
    for e in fase2_edges_10:
        fase2.Add(FASE2_SIZE, FASE2_SIZE2, e.wrapped, fase2_side_10[0].wrapped)  # the first distance lies on this face
    add(Compound.cast(fase2.Shape()), mode=Mode.REPLACE)

    # Skizze11 → Schnitt-Linear austragen8 (cut)
    with BuildSketch(Plane.XZ.offset(2.13).offset(SCHNITT_LINEAR_START)):
        with BuildLine():
            Line((-13.960000002, 7.6), (-13.960000002, 6.1))
            ThreePointArc((-13.960000002, 6.1), (-12.89933983, 5.660660172), (-12.460000002, 4.6))
            Line((-12.460000002, 4.6), (-12.460000002, 1.5))
            ThreePointArc((-12.460000002, 1.5), (-12.89933983, 0.439339828), (-13.960000002, 0))
            Line((-13.960000002, 0), (-13.960000002, -1.5))
            ThreePointArc((-13.960000002, -1.5), (-11.838679658, -0.621320344), (-10.960000002, 1.5))
            Line((-10.960000002, 1.5), (-10.960000002, 4.6))
            ThreePointArc((-10.960000002, 4.6), (-11.838679658, 6.721320344), (-13.960000002, 7.6))
        make_face()
    extrude(amount=-SCHNITT_LINEAR_AUSTRAGEN8_DEPTH, mode=Mode.SUBTRACT)

    # Skizze13 → Schnitt-Linear austragen5 (cut)
    with BuildSketch(Plane.XY.offset(24.1).offset(SCHNITT_LINEAR_START_2)):
        with BuildLine():
            Line((-12.960000002, 5.87), (-12.960000002, 9.87))
            ThreePointArc((-12.960000002, 9.87), (-13.252893221, 10.577106781), (-13.960000002, 10.87))
            Line((-13.960000002, 10.87), (-13.960000002, 12.37))
            ThreePointArc((-13.960000002, 12.37), (-12.192233049, 11.637766953), (-11.460000002, 9.87))
            Line((-11.460000002, 9.87), (-11.460000002, 5.87))
            ThreePointArc((-11.460000002, 5.87), (-12.192233049, 4.102233047), (-13.960000002, 3.37))
            Line((-13.960000002, 3.37), (-13.960000002, 4.87))
            ThreePointArc((-13.960000002, 4.87), (-13.252893221, 5.162893219), (-12.960000002, 5.87))
        make_face()
    extrude(amount=-SCHNITT_LINEAR_AUSTRAGEN5_DEPTH, mode=Mode.SUBTRACT)

    # Verrundung1
    verrundung1_edges = [part.edges().sort_by_distance(p)[0] for p in [
        (-13.960000002, 16.37, 3.05),
    ]]
    fillet(verrundung1_edges, radius=VERRUNDUNG1_R)

    # Skizze16 → Schnitt-Linear austragen9 (cut)
    with BuildSketch(Plane.XY.offset(6.1)):
        with BuildLine():
            Line((-7.800000002, 12.818775843), (-7.800000002, 15.07))
            ThreePointArc((-7.800000002, 15.07), (-8.132529072, 15.938331734), (-8.960000002, 16.362439554))
            Line((-8.960000002, 16.362439554), (-8.960000002, 15.4442739))
            ThreePointArc((-8.960000002, 15.4442739), (-8.102919524, 14.253944827), (-7.800000002, 12.818775843))
        make_face()
        with BuildLine():
            Line((-8.960000002, 15.4442739), (-8.960000002, 16.362439554))
            ThreePointArc((-8.960000002, 16.362439554), (-9.029898004, 16.368108512), (-9.100000002, 16.37))
            Line((-9.100000002, 16.37), (-11.351224158, 16.37))
            ThreePointArc((-11.351224158, 16.37), (-10.069143644, 16.130491798), (-8.960000002, 15.4442739))
        make_face()
    extrude(amount=-SCHNITT_LINEAR_AUSTRAGEN9_DEPTH, mode=Mode.SUBTRACT)


with BuildPart() as body_2:
    # Skizze1 → Aufsatz-Linear austragen1 2 (new body)
    with BuildSketch(Plane.XY):
        with Locations((-3, 7.5)):
            Rectangle(SKIZZE1_W, SKIZZE1_H)
    extrude(amount=AUFSATZ_LINEAR_AUSTRAGEN1_2_DEPTH)

    # Skizze2 → Schnitt-Linear austragen1 (cut)
    with BuildSketch(Plane.XY.offset(6.1)):
        with Locations((-3, 7.5)):
            Rectangle(SKIZZE2_W, SKIZZE2_H)
    extrude(amount=-SCHNITT_LINEAR_AUSTRAGEN1_DEPTH, mode=Mode.SUBTRACT)


with BuildPart() as part_1:
    # Körper-Verschieben/Kopieren1: moved
    add(part.part.rotate(Axis((-10.55, 0, 5.55), (0, -1, 0)), K_RPER_VERSCHIEBEN_KOPIEREN1_ANGLE))


solid = part_1.part
